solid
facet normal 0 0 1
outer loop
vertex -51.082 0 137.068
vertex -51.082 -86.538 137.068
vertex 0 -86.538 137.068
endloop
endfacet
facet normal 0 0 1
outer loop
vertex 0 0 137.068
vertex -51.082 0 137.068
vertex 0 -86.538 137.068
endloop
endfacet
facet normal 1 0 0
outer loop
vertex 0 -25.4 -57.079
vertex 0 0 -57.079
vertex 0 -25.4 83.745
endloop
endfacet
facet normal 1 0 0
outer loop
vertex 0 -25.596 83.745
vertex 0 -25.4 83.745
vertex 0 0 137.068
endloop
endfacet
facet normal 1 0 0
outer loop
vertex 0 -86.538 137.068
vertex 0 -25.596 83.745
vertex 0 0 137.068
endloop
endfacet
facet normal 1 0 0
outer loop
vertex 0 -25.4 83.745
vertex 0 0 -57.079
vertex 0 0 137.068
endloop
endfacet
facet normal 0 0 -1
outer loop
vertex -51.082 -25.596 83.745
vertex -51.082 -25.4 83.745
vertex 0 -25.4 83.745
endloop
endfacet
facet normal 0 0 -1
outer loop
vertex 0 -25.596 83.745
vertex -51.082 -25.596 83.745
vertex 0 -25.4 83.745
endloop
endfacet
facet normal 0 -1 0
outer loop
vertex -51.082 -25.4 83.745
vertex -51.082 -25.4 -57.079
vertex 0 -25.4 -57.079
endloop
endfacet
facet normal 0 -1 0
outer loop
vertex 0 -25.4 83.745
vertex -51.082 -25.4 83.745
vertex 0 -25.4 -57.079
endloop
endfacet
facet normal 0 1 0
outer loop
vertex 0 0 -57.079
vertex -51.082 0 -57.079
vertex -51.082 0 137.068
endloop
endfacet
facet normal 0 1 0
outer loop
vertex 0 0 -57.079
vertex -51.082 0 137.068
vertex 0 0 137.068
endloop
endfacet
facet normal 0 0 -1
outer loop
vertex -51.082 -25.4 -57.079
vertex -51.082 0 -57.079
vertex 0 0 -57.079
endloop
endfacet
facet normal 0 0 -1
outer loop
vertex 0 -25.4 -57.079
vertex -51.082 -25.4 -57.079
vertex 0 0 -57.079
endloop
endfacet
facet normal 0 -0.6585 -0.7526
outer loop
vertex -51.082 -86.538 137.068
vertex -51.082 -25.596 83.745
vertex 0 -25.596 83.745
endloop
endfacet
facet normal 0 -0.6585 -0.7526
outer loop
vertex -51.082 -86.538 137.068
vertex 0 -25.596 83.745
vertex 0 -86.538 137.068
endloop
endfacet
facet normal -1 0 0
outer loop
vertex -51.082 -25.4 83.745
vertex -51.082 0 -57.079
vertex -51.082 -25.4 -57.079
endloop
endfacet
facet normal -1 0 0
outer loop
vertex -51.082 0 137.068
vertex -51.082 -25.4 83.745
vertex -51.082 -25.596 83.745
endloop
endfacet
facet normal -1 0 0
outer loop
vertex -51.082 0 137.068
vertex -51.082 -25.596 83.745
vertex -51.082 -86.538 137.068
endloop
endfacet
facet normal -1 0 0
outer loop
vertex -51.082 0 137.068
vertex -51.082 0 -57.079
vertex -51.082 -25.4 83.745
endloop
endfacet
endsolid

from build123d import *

# Parameters (mm, degrees)
F0_W        = 51.0822050273
F0_H        = 117.4111329019
F1_DEPTH    = 25.4
F2_DEPTH    = 76.7365470529
F3_W        = 51.0822050273
F3_H        = 53.3235035837
F4_DEPTH    = 61.1563976854
F5_T1_DEPTH = 365.1602492866


# Not quite as in the source:
# - a fillet or chamfer that OpenCascade refuses, or shapes differently, is made with other operations: its cross-section is extruded or revolved along the edge and cut away or added


with BuildPart() as f1:
    # F0 (on Front) → F1 (new body)
    with BuildSketch(Plane.XZ):
        with Locations((-25.5411025137, 1.6260724515)):
            Rectangle(F0_W, F0_H)
    extrude(amount=F1_DEPTH)

    # F2 (add): a face of the model
    f2_faces = [f1.faces().sort_by_distance(p)[0] for p in [
        (-25.5411025137, -12.7, 60.3316389024),
    ]]
    extrude(f2_faces, amount=F2_DEPTH)

    # F3 (on face) → F4 (join)
    with BuildSketch(Plane.XZ.offset(25.4)):
        with Locations((-25.5411025137, 110.4064341635)):
            Rectangle(F3_W, F3_H)
    extrude(amount=F4_DEPTH)

    # F5: chamfer of 60.96 x 53.34 on 1 edges, made by hand

    # F5_s2 → F5_t1 (cut)
    with BuildSketch(Plane.YZ.offset(-208.121227157)):
        Polygon((-25.5963976854, 83.7446823716), (-86.5563976854, 137.0846823716), (-86.5563976854, 83.7446823716), align=None)
    extrude(amount=F5_T1_DEPTH, mode=Mode.SUBTRACT)


solid = f1.part
